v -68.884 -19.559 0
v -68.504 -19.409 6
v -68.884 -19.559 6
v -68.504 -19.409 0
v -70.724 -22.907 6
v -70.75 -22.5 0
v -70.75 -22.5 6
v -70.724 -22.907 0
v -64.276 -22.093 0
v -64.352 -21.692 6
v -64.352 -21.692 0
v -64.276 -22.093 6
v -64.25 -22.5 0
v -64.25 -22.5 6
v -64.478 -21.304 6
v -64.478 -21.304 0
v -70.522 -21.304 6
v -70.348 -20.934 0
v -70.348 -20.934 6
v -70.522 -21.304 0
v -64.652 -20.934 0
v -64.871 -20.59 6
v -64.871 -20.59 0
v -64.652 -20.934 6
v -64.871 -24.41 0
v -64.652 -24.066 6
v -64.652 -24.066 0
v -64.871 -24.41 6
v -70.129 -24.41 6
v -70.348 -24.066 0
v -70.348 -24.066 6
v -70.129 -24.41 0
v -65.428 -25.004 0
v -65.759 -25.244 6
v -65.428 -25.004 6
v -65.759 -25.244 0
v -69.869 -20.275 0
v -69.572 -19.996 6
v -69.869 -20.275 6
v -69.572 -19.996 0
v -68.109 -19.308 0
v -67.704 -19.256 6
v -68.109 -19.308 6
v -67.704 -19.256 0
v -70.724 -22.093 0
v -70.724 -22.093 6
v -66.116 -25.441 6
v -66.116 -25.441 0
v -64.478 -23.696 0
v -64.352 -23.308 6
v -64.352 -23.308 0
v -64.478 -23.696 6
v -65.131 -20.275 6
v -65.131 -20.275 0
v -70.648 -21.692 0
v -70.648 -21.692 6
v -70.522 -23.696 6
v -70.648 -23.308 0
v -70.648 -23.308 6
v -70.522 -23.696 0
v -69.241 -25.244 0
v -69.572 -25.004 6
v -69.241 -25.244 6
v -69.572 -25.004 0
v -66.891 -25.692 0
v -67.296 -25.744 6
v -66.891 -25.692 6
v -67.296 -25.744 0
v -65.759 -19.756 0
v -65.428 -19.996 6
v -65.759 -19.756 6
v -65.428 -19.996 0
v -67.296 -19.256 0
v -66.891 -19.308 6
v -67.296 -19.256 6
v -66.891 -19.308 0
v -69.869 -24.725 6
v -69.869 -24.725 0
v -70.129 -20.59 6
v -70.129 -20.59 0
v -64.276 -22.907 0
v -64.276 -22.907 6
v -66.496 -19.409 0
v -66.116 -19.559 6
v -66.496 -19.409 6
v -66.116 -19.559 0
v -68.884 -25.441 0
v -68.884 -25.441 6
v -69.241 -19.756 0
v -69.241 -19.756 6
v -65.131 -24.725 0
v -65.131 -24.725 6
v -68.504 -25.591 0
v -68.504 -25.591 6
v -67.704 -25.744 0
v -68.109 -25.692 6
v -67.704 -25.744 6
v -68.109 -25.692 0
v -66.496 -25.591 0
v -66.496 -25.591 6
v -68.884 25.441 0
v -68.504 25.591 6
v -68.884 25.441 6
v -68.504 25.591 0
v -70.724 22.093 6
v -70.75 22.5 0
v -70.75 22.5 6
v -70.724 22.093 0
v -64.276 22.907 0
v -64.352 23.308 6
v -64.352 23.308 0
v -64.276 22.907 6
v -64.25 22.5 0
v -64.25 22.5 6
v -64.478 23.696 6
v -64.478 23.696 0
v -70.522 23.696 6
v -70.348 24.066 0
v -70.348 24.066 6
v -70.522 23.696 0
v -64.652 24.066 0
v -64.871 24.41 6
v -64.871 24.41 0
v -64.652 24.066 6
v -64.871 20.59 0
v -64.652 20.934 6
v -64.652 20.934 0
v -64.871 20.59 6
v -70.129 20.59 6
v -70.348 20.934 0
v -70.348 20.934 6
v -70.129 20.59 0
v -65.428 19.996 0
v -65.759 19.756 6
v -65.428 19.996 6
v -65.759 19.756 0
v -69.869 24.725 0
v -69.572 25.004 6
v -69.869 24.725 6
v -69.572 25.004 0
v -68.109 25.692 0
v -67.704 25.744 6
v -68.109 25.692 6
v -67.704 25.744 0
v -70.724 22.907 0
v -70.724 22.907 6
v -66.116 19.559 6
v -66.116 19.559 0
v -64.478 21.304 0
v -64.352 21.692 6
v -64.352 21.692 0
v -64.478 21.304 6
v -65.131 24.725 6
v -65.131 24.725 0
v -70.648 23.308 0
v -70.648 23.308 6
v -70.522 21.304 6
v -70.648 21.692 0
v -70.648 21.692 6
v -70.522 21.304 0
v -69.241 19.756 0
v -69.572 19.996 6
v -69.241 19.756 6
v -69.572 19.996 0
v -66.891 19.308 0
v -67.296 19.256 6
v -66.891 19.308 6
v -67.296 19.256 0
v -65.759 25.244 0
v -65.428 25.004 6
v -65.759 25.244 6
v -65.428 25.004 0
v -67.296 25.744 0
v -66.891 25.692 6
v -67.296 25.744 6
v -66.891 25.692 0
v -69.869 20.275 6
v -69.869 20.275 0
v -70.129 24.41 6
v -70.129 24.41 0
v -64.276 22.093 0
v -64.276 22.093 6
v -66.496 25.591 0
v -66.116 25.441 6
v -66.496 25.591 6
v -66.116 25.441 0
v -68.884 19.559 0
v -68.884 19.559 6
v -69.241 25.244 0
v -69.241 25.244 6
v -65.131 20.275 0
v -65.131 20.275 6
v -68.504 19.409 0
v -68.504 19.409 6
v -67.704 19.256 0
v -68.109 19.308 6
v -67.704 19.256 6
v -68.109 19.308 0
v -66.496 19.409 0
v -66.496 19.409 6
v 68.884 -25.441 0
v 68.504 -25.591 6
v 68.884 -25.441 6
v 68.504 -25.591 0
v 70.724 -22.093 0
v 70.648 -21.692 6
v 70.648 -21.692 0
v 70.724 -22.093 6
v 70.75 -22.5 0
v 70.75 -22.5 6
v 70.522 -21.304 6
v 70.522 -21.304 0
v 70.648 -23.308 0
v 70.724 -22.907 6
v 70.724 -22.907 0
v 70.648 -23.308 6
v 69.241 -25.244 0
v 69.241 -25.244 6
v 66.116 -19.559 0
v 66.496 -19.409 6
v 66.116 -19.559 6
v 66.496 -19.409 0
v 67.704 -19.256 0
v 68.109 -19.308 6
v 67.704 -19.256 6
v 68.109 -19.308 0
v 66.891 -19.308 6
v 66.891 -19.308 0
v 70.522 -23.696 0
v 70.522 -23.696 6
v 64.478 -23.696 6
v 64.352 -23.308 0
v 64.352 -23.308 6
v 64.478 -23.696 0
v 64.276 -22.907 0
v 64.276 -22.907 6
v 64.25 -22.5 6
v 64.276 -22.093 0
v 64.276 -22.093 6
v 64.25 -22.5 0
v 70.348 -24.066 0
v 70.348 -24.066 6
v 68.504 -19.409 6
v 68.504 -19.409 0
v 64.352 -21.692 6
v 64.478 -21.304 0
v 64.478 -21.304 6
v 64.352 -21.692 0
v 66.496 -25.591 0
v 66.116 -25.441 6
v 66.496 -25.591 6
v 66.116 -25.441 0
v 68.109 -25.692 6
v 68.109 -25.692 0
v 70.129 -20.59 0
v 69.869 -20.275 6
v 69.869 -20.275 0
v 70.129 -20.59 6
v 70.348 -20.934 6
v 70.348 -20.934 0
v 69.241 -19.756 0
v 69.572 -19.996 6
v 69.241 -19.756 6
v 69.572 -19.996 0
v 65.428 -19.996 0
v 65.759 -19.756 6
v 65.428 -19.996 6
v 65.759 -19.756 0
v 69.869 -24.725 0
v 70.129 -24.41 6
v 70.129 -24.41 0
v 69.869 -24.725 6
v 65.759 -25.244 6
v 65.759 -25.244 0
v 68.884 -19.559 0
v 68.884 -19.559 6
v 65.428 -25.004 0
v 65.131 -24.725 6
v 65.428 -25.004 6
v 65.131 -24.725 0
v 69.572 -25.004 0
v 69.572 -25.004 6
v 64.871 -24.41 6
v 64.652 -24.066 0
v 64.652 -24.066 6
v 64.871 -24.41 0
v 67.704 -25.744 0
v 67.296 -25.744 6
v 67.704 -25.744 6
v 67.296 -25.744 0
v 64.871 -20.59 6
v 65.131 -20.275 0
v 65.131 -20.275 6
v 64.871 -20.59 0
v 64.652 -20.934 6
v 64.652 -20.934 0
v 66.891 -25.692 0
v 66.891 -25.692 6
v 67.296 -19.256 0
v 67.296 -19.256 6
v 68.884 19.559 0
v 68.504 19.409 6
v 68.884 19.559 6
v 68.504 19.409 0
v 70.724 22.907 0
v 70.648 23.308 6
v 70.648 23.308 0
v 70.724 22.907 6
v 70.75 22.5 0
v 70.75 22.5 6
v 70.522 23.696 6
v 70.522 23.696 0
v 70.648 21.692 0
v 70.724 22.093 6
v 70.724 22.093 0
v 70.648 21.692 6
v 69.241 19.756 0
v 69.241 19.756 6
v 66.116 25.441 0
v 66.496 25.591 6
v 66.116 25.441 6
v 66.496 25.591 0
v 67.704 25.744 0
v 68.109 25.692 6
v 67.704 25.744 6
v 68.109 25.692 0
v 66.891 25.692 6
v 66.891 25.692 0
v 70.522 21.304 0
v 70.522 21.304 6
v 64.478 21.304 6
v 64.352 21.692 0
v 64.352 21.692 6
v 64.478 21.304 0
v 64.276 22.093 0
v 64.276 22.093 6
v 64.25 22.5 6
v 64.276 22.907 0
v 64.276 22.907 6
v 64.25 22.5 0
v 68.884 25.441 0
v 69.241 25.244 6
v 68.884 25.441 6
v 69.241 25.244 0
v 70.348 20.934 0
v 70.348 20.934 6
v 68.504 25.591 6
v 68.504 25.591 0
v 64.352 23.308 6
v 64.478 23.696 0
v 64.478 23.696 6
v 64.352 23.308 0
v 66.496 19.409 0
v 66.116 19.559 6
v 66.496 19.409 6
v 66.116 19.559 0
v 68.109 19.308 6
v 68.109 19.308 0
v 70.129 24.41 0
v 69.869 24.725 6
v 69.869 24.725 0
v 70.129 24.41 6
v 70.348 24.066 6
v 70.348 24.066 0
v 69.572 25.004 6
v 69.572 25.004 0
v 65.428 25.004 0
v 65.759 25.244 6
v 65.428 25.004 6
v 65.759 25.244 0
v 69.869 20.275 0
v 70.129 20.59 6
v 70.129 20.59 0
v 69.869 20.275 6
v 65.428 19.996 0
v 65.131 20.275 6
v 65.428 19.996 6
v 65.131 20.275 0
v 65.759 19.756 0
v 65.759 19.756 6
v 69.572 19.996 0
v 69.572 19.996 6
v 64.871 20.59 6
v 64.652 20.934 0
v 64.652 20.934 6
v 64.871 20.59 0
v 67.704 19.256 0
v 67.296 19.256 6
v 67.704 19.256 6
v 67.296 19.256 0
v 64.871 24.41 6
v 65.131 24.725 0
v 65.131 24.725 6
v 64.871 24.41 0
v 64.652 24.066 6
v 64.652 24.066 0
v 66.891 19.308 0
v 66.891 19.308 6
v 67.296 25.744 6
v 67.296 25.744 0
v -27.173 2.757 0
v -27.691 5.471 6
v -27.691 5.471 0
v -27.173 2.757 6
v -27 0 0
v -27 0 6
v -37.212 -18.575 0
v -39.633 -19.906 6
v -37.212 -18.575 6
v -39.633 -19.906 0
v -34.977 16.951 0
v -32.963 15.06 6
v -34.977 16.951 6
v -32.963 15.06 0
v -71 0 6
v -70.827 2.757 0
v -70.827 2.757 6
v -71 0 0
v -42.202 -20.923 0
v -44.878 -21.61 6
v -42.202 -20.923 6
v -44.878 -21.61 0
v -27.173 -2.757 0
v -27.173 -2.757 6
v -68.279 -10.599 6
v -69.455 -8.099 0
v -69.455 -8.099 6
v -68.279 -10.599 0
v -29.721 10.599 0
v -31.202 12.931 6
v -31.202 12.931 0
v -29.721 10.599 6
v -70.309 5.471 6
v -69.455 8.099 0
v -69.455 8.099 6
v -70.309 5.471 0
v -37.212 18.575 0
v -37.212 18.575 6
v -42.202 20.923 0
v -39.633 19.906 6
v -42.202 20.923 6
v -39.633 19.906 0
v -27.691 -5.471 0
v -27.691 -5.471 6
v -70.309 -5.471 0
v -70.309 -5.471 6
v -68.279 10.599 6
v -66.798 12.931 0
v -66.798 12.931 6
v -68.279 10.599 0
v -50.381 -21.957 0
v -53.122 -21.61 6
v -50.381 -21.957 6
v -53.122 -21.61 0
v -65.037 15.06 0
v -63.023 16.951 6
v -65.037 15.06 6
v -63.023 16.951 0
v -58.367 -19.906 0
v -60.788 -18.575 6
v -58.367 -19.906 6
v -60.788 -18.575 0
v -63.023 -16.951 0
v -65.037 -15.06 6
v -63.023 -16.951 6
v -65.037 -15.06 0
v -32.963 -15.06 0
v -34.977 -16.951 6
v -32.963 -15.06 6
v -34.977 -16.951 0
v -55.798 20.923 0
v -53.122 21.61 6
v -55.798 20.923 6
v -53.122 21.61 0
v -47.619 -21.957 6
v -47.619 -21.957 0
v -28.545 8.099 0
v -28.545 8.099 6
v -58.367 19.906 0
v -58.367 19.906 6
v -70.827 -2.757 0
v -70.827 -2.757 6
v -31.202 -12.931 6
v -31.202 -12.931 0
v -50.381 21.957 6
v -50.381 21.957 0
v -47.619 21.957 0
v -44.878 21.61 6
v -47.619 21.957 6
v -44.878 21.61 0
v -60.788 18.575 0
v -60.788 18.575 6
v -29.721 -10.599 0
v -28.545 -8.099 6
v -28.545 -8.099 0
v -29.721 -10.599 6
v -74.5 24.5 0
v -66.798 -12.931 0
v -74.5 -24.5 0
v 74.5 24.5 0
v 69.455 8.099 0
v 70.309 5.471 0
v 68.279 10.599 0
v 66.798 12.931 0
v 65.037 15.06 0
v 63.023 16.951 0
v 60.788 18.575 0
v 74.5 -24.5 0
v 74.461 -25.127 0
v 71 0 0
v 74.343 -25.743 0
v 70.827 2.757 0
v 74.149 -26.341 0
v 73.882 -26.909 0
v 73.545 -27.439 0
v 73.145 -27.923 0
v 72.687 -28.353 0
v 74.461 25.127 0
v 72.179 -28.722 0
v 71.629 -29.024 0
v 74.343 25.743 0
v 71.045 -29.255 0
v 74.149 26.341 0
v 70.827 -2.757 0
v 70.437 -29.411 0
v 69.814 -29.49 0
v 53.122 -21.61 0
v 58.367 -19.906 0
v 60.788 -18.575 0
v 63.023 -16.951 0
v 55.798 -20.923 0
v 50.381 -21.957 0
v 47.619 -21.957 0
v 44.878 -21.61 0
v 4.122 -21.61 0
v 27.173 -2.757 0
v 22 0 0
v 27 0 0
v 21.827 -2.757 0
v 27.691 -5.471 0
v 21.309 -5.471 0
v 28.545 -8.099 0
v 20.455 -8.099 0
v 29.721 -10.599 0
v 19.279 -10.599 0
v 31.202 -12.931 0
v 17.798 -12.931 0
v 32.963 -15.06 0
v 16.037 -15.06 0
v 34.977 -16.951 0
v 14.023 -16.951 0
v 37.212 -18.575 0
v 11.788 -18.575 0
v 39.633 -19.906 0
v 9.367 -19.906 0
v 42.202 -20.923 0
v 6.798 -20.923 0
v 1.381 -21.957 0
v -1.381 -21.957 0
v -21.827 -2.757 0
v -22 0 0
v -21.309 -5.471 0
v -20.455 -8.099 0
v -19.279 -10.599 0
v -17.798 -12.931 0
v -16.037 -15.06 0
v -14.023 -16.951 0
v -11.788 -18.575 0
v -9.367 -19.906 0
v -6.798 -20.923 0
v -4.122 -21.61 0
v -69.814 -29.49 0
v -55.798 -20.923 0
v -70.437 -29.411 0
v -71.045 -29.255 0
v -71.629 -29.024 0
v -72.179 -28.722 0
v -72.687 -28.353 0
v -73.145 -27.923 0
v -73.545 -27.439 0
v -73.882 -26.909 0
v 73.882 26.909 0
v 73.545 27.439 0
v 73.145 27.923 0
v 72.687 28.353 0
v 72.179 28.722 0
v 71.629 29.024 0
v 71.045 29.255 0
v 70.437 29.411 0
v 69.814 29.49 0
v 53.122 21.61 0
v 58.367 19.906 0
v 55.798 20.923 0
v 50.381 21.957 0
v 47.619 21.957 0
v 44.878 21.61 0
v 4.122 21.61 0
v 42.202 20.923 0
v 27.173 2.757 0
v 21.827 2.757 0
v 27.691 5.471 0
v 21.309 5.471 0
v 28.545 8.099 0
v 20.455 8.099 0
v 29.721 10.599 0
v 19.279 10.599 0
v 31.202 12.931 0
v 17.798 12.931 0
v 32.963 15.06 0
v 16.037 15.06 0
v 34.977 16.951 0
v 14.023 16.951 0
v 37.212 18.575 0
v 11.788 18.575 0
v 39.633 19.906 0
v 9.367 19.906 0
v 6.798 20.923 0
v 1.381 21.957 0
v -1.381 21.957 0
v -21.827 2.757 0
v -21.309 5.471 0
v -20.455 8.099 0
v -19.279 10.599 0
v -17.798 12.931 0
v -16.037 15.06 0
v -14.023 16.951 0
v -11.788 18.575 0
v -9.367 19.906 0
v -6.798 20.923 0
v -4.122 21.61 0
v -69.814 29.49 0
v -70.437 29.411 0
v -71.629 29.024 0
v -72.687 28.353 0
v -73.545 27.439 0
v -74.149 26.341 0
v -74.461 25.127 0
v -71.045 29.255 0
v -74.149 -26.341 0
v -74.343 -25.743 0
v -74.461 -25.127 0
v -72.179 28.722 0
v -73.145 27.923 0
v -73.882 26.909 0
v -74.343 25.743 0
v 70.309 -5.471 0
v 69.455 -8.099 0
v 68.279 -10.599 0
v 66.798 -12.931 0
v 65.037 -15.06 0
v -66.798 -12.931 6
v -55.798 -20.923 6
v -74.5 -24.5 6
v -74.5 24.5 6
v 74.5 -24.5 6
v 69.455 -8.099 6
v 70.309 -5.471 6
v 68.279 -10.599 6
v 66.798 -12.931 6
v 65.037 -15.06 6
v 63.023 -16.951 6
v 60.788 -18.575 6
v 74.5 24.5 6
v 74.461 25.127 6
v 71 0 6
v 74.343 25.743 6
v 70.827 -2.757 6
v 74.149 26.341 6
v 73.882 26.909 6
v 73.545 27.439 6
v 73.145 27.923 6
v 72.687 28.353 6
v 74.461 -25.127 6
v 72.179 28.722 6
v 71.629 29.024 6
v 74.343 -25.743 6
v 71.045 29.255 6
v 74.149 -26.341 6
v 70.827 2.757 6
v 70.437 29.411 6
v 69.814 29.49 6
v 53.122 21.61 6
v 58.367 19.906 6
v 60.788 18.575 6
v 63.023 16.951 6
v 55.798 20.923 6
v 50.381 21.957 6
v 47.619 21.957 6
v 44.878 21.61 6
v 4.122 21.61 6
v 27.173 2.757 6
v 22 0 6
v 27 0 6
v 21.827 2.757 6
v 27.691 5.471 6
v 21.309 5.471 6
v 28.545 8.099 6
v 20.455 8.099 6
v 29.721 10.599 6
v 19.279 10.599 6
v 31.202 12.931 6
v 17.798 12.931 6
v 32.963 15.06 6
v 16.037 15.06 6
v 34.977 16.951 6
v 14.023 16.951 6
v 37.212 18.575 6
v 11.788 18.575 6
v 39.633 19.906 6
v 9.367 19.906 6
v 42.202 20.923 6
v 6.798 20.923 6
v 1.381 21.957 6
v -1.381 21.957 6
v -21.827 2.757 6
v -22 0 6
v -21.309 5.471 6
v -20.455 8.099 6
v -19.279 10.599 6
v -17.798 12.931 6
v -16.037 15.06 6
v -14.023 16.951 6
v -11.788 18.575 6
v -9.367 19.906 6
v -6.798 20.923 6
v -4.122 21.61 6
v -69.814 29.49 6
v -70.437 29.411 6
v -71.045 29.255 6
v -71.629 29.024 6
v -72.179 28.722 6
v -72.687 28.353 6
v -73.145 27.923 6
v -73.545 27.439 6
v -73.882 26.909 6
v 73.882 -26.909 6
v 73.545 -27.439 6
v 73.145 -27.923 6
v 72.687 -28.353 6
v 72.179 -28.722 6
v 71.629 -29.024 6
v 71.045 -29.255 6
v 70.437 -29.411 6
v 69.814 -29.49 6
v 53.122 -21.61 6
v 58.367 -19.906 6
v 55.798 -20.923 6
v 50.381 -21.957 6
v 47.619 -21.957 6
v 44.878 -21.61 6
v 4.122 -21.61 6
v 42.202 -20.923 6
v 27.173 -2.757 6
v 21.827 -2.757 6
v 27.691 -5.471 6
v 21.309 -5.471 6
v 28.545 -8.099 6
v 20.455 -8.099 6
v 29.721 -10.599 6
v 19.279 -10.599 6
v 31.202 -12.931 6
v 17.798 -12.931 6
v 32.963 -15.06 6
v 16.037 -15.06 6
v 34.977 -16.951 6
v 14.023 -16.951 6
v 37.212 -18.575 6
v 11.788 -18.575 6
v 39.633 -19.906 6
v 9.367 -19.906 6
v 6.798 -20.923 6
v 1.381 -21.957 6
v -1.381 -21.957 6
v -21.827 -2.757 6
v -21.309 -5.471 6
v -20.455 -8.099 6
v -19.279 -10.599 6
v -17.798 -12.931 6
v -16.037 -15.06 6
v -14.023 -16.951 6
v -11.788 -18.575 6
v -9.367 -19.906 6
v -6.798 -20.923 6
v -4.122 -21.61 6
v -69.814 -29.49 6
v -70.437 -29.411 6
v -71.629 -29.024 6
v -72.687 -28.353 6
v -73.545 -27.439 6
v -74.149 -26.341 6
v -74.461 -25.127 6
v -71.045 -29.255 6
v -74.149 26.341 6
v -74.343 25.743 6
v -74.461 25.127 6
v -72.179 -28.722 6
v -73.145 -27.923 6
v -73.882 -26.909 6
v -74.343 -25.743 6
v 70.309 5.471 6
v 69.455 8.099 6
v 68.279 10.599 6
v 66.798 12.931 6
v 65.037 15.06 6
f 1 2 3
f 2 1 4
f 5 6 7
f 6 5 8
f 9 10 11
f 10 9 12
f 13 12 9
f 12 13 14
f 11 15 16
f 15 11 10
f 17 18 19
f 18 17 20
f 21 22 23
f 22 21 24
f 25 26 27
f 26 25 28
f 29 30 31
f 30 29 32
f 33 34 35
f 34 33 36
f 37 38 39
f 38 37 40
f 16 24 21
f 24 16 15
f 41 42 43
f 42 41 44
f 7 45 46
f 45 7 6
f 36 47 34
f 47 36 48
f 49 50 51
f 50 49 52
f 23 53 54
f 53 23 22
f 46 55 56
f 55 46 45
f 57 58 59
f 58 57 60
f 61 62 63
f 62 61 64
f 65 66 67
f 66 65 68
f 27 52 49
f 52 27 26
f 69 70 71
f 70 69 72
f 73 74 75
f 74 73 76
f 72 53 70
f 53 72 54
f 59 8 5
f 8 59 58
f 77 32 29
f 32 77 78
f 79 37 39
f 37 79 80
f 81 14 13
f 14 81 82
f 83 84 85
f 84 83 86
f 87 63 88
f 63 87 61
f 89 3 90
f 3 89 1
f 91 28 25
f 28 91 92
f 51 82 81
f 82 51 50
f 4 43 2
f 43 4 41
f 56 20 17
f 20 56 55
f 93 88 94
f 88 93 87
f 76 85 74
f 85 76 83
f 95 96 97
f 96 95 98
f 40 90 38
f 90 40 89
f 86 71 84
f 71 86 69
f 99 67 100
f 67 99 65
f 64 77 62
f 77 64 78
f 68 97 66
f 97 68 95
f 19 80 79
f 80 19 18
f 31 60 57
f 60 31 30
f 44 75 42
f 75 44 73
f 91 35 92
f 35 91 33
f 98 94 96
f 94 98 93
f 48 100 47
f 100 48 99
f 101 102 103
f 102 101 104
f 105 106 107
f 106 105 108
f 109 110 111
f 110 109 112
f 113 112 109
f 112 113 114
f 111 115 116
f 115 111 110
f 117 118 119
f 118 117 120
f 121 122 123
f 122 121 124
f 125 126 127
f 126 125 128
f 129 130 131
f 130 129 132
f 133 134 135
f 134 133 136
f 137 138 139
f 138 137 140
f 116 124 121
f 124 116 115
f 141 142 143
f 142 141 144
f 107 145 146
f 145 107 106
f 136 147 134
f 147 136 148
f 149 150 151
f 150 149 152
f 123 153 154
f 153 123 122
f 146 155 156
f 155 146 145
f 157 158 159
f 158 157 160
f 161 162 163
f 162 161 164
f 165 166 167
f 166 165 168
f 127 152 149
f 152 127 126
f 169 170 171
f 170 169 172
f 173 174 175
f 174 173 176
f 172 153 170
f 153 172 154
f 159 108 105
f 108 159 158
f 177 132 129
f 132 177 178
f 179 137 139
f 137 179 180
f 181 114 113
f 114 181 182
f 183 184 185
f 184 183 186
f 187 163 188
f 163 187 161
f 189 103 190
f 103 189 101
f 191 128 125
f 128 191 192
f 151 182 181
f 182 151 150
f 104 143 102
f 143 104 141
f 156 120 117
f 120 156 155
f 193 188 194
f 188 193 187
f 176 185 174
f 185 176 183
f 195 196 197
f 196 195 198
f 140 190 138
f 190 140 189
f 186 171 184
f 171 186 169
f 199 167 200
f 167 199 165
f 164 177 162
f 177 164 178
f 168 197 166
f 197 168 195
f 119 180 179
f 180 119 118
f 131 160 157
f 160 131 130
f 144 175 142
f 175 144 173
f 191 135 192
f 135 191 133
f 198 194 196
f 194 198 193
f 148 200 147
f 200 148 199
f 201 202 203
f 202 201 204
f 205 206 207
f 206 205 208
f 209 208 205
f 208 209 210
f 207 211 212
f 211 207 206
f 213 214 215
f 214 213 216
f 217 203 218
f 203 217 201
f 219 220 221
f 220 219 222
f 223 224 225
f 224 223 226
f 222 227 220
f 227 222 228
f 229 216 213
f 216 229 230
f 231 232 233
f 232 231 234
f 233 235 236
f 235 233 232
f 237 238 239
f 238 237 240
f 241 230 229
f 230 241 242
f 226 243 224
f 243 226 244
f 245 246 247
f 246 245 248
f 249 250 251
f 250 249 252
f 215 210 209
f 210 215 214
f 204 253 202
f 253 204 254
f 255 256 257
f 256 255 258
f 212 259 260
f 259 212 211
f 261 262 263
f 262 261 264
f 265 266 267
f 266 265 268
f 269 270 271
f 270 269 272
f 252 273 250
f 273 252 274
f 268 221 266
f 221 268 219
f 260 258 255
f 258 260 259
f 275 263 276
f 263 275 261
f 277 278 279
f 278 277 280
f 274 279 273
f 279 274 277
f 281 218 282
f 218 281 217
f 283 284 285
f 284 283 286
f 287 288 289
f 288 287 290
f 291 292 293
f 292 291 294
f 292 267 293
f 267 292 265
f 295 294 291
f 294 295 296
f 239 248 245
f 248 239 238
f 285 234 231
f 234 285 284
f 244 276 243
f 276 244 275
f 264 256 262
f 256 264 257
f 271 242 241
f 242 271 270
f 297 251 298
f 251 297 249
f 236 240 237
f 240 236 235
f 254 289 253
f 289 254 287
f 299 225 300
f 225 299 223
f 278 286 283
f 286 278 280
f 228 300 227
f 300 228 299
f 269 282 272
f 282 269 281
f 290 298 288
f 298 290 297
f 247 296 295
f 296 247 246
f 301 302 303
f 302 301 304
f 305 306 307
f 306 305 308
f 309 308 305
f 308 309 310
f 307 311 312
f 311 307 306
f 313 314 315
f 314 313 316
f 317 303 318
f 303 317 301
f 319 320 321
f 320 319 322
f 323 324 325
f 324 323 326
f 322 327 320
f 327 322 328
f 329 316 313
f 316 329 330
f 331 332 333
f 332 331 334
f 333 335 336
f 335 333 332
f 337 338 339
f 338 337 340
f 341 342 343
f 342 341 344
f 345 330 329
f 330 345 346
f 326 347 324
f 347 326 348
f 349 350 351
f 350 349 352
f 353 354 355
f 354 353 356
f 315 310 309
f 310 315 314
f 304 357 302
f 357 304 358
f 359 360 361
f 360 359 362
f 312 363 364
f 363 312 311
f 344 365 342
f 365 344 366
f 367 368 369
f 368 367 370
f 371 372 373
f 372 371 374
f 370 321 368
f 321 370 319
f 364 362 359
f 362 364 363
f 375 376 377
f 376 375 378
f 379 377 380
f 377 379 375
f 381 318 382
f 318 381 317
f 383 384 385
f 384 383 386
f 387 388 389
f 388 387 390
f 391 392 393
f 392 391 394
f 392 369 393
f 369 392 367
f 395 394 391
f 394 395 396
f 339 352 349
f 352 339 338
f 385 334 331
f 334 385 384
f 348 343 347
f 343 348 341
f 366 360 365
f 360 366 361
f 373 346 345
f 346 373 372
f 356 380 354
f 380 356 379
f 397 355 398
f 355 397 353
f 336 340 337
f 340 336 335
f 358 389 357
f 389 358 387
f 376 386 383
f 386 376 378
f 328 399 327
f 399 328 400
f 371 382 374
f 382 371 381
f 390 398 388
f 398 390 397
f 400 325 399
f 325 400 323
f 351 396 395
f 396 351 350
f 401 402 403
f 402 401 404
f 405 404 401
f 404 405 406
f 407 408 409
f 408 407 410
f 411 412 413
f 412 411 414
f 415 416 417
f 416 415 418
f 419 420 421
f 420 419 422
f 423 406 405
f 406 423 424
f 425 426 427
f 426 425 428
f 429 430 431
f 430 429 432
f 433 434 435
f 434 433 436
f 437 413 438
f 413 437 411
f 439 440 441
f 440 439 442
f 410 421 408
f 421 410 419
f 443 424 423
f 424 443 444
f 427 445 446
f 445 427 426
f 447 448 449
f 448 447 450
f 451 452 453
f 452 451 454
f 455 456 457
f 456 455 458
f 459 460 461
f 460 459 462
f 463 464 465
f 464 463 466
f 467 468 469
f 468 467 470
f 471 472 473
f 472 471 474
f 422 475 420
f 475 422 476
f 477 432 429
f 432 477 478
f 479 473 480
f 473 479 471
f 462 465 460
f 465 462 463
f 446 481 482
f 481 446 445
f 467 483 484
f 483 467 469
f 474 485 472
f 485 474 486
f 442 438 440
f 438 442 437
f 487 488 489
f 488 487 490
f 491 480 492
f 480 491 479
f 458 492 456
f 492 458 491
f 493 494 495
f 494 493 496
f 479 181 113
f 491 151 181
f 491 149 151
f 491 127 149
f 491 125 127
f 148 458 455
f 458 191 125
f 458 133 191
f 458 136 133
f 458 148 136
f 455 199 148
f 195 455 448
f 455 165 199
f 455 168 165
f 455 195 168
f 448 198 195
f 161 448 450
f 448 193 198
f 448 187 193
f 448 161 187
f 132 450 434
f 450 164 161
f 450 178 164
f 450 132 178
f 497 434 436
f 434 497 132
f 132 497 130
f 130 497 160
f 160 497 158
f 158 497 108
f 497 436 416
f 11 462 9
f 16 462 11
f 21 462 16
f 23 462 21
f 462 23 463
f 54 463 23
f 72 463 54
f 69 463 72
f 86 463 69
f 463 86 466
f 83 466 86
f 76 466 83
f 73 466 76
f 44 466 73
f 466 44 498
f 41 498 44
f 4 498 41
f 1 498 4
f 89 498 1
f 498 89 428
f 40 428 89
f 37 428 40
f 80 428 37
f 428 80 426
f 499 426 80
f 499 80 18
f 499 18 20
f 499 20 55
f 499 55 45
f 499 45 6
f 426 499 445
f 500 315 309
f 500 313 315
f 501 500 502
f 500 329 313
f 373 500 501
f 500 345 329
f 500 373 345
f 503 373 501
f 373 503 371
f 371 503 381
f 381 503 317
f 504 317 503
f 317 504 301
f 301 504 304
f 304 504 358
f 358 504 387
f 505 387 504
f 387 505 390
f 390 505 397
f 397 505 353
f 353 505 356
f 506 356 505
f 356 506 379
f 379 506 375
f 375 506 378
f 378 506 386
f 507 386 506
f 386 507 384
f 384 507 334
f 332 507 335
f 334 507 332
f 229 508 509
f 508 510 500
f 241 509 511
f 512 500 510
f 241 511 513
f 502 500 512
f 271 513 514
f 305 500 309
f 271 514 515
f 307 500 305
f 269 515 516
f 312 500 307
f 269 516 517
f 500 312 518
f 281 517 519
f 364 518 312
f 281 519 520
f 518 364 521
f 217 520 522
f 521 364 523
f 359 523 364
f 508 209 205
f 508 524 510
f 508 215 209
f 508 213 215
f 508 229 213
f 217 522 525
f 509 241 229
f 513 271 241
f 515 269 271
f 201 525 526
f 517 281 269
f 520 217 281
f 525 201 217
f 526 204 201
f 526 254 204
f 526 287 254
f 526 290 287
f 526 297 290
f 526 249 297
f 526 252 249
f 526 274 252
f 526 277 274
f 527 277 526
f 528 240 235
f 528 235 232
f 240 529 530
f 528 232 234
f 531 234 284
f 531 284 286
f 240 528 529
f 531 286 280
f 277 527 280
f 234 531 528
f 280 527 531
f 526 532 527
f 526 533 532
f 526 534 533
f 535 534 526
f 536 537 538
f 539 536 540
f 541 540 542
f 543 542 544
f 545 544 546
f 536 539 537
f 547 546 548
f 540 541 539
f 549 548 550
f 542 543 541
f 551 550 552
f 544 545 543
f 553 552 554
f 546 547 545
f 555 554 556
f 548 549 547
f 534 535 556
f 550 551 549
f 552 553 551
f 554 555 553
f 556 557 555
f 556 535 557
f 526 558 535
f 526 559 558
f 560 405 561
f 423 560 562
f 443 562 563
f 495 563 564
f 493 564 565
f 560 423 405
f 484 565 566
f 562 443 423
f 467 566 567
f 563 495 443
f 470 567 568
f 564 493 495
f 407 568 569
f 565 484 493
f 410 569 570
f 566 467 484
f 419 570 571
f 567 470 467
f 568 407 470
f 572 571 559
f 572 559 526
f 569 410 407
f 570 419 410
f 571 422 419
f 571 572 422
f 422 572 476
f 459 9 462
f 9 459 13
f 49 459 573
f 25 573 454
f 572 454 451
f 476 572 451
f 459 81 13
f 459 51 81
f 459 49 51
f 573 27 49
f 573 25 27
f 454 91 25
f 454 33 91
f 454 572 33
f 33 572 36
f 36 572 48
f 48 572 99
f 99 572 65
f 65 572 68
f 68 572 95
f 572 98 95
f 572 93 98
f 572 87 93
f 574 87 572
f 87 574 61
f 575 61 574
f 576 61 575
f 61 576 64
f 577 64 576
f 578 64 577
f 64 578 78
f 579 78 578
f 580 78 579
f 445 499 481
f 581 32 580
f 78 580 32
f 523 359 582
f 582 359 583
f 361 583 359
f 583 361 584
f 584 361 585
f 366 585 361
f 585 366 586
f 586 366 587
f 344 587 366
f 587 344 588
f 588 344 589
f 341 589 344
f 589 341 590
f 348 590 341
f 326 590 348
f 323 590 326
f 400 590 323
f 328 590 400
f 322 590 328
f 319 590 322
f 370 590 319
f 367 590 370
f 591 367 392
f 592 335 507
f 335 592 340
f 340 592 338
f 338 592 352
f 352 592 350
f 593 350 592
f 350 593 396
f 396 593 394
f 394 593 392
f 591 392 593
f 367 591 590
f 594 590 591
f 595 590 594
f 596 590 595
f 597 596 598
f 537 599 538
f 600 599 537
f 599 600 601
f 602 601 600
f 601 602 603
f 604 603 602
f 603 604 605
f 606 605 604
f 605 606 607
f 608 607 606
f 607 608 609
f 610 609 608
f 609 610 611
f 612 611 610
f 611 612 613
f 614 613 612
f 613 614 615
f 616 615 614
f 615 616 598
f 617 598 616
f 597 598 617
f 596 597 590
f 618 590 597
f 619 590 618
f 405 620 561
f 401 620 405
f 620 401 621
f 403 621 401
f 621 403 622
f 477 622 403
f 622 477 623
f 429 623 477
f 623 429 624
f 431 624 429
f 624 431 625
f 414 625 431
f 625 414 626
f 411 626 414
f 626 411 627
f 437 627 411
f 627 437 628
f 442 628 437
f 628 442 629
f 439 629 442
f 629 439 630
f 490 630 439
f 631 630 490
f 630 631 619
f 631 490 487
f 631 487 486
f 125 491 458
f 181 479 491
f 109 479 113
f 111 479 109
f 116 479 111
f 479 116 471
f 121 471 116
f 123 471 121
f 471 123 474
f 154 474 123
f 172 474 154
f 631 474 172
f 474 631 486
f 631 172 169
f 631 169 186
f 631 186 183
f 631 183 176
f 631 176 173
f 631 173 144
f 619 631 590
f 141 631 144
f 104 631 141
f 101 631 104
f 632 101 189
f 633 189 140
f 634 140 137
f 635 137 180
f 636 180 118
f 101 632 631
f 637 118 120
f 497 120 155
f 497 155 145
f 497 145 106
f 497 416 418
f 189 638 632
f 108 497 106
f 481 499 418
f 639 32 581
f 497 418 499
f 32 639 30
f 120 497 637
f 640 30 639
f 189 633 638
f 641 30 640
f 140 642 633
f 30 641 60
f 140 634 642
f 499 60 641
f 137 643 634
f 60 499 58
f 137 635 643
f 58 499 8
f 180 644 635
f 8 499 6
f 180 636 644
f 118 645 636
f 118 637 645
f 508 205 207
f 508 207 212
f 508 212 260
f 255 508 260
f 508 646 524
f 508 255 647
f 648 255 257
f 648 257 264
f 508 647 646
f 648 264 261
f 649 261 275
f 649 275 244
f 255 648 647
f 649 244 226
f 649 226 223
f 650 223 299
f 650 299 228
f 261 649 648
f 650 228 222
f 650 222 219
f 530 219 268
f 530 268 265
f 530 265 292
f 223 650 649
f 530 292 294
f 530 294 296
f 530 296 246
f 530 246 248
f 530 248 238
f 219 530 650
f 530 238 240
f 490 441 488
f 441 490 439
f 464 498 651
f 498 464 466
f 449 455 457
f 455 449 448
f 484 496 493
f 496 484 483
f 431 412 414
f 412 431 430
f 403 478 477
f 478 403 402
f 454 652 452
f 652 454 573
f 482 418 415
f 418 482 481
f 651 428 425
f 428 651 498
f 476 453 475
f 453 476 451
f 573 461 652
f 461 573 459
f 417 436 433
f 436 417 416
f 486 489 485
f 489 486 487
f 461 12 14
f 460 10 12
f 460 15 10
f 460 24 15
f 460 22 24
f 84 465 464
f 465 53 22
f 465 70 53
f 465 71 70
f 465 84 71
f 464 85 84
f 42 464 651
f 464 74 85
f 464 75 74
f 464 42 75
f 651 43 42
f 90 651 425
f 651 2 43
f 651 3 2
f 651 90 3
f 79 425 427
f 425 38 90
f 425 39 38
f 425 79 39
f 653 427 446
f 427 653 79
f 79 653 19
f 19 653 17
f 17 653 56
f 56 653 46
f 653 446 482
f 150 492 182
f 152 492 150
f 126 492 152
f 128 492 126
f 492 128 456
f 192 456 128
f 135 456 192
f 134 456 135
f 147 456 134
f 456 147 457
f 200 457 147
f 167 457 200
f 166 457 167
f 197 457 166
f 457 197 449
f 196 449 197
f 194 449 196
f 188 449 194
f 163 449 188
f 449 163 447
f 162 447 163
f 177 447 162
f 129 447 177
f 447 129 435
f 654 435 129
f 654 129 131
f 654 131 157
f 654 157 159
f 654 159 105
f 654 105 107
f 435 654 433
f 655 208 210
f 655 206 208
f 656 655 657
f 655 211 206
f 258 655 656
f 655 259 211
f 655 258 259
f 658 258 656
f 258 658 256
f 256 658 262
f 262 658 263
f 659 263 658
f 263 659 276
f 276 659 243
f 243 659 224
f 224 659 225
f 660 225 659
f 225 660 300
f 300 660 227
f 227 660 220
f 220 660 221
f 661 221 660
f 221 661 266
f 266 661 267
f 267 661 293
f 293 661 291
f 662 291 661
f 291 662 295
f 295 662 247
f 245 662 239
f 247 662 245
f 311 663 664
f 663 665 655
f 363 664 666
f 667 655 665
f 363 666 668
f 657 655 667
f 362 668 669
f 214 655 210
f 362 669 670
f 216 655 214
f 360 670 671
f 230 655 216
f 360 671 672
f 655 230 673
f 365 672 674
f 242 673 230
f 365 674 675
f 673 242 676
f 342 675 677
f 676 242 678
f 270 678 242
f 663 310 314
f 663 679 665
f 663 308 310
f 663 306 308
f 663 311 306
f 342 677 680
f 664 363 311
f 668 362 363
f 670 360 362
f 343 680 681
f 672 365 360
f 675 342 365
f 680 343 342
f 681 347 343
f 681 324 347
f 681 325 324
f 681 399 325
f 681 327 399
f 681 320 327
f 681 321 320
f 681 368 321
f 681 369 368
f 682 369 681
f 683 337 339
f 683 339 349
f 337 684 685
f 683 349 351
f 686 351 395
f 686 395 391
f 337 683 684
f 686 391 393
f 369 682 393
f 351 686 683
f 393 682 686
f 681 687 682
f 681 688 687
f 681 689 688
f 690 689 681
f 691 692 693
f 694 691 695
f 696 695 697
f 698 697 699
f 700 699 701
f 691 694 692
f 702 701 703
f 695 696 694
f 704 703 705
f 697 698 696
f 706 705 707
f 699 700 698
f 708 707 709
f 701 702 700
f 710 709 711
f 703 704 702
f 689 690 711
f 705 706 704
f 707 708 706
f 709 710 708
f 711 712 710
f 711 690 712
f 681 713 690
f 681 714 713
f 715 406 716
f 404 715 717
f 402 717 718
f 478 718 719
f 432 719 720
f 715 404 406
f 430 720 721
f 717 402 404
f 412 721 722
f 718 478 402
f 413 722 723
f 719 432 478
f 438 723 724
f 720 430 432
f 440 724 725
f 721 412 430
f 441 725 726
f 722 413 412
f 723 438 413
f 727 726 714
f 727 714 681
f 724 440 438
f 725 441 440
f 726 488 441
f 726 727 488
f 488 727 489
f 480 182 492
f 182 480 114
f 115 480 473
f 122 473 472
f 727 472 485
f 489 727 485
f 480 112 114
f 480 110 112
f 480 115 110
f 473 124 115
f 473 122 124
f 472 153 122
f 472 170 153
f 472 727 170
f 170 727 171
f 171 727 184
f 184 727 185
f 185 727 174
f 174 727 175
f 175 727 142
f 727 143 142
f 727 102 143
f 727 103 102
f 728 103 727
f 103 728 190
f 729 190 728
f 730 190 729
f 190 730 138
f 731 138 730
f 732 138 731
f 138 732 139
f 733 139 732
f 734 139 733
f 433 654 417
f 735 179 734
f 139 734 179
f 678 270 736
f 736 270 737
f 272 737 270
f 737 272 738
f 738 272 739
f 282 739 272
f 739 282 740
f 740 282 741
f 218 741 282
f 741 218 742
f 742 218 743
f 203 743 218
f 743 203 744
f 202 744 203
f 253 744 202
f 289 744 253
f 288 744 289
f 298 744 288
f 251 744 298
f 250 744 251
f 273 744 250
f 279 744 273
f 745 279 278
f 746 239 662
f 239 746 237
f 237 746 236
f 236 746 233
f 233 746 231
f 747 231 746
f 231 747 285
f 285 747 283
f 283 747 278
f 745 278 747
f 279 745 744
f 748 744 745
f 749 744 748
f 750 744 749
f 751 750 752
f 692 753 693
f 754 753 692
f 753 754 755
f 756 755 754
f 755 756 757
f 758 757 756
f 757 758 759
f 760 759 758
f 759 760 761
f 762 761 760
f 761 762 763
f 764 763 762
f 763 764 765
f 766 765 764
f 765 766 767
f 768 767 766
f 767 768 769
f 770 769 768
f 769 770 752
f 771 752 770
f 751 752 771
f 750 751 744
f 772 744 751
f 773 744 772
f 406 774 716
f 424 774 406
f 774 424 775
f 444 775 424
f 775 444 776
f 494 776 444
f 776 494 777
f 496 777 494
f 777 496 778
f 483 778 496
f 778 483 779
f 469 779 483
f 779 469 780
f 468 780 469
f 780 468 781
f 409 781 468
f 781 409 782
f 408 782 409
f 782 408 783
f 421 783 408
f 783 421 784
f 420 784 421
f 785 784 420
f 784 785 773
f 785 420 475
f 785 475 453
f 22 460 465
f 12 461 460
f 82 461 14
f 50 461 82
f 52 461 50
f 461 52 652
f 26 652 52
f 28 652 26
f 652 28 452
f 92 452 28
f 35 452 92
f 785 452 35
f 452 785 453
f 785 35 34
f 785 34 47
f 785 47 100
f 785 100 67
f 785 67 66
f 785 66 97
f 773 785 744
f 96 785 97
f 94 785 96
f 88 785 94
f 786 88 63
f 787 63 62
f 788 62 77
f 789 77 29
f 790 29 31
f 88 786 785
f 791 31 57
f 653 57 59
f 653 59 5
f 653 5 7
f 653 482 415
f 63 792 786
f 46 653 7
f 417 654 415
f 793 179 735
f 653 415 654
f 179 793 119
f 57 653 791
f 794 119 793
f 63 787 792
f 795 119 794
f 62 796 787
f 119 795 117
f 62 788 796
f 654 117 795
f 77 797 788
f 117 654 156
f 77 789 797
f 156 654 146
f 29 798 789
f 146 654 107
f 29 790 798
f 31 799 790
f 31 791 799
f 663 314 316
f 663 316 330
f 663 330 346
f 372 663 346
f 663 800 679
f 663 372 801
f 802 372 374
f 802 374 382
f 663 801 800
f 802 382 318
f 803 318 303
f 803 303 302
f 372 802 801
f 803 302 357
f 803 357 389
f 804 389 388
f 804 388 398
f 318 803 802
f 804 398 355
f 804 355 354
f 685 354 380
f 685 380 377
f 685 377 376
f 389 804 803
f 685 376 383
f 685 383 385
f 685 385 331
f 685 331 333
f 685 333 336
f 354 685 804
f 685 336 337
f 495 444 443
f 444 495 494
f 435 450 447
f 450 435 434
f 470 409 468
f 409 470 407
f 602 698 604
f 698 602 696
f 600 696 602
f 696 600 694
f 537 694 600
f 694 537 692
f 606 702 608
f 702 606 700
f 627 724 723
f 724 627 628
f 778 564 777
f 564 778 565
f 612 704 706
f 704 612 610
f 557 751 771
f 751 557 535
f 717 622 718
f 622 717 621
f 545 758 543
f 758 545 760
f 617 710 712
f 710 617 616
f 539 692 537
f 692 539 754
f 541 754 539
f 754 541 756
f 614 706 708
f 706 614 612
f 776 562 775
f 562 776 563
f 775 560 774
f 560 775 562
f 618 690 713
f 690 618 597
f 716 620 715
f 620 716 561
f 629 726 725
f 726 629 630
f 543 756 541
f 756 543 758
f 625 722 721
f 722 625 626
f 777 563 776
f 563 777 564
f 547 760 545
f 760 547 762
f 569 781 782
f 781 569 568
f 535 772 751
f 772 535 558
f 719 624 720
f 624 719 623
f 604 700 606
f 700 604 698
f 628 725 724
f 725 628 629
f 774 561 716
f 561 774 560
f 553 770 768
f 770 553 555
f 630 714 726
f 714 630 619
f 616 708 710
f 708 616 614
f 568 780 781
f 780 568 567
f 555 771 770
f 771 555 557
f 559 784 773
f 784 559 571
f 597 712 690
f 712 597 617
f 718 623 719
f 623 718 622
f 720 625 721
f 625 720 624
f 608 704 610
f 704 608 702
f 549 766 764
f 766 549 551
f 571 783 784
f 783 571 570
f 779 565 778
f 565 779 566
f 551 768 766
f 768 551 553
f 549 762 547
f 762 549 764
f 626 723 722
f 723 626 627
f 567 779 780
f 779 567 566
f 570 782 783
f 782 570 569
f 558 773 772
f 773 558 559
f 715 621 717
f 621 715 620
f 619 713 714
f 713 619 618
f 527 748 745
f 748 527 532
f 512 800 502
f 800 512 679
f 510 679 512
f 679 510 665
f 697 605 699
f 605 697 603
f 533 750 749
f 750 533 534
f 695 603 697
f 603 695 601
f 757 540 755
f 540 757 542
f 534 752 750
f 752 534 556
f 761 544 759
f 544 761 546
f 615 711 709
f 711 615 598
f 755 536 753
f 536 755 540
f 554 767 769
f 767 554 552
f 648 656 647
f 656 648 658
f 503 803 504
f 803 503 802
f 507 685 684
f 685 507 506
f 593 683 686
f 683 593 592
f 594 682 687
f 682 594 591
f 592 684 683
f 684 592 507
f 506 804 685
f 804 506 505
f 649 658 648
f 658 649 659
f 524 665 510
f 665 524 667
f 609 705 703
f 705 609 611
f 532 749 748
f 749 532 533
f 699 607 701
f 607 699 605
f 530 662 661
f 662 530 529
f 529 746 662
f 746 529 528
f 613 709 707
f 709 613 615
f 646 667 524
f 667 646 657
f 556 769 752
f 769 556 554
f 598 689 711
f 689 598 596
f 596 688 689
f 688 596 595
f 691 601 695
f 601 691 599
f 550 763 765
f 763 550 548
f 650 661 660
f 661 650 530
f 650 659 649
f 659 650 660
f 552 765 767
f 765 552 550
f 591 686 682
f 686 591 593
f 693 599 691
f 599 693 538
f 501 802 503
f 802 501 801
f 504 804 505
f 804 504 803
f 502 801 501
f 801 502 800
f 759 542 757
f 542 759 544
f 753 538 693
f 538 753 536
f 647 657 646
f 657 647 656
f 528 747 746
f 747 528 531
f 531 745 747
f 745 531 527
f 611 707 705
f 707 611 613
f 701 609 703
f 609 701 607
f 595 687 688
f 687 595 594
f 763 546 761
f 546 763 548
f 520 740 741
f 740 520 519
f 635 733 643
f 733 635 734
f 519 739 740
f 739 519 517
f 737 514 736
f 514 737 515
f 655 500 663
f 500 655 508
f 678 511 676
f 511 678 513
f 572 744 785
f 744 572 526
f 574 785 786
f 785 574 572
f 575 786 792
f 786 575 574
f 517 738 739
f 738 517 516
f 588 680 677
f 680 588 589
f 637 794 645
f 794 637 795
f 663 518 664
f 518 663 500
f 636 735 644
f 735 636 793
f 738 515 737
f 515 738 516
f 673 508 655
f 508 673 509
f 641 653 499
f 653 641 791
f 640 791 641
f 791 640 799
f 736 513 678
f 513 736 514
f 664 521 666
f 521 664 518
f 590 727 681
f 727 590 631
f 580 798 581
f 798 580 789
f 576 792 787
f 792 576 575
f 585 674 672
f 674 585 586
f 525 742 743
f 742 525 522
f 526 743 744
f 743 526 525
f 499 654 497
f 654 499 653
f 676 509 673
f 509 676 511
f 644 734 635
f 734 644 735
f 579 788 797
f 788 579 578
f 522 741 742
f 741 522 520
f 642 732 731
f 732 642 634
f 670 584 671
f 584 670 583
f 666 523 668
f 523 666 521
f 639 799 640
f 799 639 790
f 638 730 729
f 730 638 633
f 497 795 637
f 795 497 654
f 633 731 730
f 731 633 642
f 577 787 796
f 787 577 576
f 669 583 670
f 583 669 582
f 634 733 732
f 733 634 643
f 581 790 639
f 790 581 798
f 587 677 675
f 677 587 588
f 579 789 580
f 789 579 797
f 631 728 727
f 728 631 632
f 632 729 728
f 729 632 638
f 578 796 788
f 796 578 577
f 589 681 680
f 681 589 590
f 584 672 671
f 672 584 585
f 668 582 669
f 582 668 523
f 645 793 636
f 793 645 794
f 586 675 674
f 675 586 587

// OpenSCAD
$fn = 50;

difference() {
	union() {
		hull() {
			translate(v = [-69.5, 24.5, 0]) {
				cylinder(h = 6, r = 5);
			}
			translate(v = [69.5, 24.5, 0]) {
				cylinder(h = 6, r = 5);
			}
			translate(v = [-69.5, -24.5, 0]) {
				cylinder(h = 6, r = 5);
			}
			translate(v = [69.5, -24.5, 0]) {
				cylinder(h = 6, r = 5);
			}
		}
	}
	union() {
		translate(v = [-67.5, -22.5, -100.0]) {
			cylinder(h = 200, r = 3.25);
		}
		translate(v = [-67.5, 22.5, -100.0]) {
			cylinder(h = 200, r = 3.25);
		}
		translate(v = [67.5, -22.5, -100.0]) {
			cylinder(h = 200, r = 3.25);
		}
		translate(v = [67.5, 22.5, -100.0]) {
			cylinder(h = 200, r = 3.25);
		}
		translate(v = [-67.5, -22.5, -100.0]) {
			cylinder(h = 200, r = 1.8);
		}
		translate(v = [-67.5, 22.5, -100.0]) {
			cylinder(h = 200, r = 1.8);
		}
		translate(v = [67.5, -22.5, -100.0]) {
			cylinder(h = 200, r = 1.8);
		}
		translate(v = [67.5, 22.5, -100.0]) {
			cylinder(h = 200, r = 1.8);
		}
		translate(v = [-49.0, 0, 0.0]) {
			cylinder(h = 6, r = 22.0);
		}
		cylinder(h = 6, r = 22.0);
		translate(v = [49.0, 0, 0.0]) {
			cylinder(h = 6, r = 22.0);
		}
	}
}
